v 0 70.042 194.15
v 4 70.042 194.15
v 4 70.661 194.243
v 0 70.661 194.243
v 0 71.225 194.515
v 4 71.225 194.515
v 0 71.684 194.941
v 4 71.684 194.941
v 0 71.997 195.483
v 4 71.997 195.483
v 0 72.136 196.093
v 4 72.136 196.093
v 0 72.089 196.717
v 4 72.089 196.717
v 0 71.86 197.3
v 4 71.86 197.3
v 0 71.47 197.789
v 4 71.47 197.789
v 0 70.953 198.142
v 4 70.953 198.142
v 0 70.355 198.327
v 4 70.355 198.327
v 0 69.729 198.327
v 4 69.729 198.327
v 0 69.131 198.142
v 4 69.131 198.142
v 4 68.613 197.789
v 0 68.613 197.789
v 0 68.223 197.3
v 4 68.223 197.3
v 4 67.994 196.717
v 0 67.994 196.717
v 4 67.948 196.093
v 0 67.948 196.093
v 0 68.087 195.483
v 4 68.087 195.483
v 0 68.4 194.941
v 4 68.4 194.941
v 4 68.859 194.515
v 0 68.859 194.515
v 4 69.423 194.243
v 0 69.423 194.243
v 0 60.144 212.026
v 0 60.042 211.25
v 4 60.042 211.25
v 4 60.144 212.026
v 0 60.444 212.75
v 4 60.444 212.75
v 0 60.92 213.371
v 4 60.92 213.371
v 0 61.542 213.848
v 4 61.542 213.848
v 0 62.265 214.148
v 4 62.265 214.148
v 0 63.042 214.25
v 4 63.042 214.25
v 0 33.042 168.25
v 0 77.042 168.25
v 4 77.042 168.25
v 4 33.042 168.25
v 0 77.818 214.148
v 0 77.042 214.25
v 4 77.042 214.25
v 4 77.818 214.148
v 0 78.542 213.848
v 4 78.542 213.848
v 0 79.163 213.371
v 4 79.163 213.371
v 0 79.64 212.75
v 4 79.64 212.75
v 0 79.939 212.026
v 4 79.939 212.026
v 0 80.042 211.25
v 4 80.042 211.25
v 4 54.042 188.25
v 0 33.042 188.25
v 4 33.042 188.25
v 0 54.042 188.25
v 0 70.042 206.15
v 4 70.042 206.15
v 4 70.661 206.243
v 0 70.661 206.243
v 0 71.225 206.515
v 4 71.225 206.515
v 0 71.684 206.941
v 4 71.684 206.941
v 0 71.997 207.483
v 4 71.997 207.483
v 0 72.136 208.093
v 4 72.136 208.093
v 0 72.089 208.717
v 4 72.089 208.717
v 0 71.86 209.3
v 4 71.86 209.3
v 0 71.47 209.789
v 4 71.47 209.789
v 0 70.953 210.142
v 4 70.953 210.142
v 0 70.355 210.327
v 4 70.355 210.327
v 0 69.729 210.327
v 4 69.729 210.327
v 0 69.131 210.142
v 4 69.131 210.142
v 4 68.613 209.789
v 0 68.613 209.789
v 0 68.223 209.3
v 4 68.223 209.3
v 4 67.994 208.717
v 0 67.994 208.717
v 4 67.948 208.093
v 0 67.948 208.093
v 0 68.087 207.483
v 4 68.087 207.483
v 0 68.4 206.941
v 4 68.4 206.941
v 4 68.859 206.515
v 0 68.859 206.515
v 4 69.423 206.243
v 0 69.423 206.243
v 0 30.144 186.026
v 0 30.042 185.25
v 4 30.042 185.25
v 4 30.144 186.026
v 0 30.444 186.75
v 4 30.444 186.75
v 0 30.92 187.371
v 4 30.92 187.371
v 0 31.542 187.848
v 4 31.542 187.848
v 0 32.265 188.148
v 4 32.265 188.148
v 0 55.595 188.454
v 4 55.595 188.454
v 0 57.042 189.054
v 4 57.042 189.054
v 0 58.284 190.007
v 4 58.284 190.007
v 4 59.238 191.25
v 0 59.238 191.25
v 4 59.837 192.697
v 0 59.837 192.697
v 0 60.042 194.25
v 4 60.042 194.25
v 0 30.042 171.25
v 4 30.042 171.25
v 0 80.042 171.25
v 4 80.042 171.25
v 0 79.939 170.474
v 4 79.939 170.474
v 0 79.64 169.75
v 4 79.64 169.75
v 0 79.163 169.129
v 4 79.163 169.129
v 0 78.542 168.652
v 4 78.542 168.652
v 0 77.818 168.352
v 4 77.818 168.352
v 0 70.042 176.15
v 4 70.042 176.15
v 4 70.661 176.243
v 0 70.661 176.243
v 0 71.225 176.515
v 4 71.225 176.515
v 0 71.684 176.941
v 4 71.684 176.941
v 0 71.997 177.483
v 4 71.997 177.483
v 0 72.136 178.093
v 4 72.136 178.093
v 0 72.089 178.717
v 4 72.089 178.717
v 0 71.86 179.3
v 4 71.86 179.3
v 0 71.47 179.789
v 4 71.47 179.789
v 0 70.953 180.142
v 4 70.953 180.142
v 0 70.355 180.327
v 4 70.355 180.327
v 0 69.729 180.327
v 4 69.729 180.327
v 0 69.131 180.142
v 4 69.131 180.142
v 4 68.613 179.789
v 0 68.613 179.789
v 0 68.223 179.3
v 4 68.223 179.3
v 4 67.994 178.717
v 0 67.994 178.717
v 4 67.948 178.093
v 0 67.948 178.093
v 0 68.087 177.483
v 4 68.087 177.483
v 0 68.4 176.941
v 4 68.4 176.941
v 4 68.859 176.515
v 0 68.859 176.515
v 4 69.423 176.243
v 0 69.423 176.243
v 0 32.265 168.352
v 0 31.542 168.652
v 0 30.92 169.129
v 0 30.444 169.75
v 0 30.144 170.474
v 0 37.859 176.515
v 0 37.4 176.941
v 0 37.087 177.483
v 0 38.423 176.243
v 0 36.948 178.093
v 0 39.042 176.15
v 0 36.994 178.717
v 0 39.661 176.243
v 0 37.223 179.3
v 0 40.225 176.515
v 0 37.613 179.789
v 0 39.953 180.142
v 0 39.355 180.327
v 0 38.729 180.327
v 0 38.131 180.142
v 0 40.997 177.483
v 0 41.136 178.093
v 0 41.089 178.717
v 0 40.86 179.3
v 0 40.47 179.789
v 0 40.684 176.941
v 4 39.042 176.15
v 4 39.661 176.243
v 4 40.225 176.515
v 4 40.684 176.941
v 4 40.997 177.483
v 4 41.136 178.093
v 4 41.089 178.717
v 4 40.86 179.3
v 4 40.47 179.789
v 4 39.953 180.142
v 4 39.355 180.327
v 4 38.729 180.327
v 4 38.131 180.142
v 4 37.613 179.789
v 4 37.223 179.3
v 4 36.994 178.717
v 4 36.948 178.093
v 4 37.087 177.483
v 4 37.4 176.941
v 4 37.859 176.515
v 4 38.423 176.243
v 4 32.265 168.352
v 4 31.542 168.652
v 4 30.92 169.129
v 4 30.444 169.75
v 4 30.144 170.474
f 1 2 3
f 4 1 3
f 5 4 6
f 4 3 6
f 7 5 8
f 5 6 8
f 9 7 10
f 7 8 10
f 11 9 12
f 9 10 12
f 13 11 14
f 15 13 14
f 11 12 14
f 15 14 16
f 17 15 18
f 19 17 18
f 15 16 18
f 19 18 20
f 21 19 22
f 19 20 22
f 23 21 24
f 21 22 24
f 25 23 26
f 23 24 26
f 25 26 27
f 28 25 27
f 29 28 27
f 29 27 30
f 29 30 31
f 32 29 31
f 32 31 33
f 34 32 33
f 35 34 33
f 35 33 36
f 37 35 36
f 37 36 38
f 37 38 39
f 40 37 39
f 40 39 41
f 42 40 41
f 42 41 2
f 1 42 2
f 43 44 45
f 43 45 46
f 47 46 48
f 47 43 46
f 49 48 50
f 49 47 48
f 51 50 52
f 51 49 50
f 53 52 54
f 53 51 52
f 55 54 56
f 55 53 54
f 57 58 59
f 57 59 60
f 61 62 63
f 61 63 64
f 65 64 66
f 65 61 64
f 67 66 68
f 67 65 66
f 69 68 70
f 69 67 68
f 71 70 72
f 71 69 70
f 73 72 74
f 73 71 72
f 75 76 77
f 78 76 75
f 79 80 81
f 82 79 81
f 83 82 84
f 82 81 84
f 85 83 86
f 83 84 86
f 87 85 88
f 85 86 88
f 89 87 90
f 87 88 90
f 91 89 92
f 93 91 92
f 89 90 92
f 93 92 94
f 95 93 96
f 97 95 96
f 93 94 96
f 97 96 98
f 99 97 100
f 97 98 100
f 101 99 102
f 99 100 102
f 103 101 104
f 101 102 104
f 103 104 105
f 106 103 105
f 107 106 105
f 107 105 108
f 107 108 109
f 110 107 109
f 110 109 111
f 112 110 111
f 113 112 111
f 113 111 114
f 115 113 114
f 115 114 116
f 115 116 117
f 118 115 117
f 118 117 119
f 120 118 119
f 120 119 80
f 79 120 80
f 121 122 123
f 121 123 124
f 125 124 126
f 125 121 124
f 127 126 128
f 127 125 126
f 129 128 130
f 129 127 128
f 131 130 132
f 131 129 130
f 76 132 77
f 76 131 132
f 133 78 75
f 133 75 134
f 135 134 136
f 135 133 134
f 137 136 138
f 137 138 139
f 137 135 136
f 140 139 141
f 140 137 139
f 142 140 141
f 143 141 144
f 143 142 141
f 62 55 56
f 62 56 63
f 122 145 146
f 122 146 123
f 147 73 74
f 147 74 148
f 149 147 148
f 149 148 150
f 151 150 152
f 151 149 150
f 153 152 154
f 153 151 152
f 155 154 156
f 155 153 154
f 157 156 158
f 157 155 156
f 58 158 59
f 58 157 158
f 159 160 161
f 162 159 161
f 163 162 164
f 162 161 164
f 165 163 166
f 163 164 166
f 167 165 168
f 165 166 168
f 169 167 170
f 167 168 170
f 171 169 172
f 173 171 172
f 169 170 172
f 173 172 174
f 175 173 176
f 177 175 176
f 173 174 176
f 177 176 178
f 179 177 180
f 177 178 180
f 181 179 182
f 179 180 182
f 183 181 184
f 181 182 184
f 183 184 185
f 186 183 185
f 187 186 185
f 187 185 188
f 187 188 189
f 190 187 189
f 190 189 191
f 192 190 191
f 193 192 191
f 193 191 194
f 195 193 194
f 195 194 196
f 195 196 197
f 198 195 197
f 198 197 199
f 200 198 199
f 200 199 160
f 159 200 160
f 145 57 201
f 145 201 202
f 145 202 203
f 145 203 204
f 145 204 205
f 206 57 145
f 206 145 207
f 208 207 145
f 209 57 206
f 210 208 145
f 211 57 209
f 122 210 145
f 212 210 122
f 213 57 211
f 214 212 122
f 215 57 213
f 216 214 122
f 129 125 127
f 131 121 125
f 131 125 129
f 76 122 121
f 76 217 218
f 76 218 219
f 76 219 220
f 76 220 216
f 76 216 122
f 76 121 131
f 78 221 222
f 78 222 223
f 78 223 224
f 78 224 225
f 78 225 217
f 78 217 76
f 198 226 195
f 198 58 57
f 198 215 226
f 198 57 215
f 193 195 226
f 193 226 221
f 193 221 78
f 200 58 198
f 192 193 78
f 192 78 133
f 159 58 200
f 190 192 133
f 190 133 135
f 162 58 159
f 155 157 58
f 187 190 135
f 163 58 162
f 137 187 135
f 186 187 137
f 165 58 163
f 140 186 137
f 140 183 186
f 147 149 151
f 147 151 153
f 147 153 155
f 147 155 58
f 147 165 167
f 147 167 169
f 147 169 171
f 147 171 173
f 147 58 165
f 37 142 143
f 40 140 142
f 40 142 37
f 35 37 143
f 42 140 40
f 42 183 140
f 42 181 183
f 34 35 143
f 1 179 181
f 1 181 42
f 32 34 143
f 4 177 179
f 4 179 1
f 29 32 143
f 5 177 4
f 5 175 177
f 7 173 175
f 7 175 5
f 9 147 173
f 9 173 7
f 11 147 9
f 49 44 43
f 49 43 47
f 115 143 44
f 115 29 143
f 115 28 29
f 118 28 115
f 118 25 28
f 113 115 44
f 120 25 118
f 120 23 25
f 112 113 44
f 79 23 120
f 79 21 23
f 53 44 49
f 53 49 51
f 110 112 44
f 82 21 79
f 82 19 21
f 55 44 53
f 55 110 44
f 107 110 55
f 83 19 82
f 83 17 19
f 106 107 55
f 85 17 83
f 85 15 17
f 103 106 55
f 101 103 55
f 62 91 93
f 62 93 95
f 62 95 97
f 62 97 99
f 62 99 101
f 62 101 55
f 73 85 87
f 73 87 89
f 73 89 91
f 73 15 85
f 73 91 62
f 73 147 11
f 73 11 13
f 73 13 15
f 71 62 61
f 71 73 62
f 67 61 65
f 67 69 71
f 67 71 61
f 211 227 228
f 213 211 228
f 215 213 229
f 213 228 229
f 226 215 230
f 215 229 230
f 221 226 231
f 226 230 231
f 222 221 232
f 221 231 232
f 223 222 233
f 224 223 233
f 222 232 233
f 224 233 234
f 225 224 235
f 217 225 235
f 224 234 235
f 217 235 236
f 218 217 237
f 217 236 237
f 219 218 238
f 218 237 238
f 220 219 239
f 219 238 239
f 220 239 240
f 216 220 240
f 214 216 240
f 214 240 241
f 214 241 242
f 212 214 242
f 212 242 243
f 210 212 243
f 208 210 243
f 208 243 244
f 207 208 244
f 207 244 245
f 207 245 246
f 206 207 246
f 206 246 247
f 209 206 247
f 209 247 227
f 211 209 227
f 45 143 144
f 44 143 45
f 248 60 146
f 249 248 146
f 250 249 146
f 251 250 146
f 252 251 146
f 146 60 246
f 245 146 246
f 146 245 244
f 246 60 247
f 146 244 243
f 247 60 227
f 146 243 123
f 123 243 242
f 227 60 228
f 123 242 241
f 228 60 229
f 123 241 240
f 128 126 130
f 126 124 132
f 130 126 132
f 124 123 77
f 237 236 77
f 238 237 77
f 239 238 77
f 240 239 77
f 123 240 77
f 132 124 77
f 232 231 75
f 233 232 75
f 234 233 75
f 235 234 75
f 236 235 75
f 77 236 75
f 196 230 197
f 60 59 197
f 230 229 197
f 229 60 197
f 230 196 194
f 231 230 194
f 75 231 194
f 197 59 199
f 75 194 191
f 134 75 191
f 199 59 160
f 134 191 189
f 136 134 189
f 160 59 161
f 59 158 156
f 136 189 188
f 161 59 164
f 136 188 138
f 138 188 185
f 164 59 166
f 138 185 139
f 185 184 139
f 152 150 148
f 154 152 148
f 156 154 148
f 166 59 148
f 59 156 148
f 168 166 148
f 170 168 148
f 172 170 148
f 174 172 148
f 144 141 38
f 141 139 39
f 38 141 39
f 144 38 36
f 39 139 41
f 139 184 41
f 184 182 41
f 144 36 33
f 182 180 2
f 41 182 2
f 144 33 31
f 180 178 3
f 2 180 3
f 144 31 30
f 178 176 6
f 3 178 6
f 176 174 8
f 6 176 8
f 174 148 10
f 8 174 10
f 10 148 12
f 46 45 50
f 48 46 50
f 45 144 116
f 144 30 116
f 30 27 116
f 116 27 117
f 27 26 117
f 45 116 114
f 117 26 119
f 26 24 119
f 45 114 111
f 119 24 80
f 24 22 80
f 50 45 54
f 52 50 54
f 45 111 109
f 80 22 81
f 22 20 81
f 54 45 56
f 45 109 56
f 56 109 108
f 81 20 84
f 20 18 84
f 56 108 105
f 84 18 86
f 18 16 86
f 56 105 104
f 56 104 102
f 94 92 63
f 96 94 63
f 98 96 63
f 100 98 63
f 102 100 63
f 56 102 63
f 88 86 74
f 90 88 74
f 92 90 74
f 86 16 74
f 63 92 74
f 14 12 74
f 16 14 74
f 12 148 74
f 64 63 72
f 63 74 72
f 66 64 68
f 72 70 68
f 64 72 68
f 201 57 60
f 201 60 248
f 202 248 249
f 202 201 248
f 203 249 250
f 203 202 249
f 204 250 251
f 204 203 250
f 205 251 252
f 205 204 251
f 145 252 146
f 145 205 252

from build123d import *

# Parameters (mm, degrees)
EXTRUDE_1_DEPTH     = 4
SKETCH_3_R          = 2.1
CUT_EXTRUDE_1_DEPTH = 10


with BuildPart() as part:
    # 草图2 → 凸台-拉伸1 (new body)
    with BuildSketch(Plane(origin=(0, 0, 0), x_dir=(0, 0, -1), z_dir=(1, 0, 0))):
        with BuildLine():
            Line((-211.25, 80.041666667), (-171.25, 80.041666667))
            ThreePointArc((-171.25, 80.041666667), (-169.128679656, 79.16298701), (-168.25, 77.041666667))
            Line((-168.25, 77.041666667), (-168.25, 33.041666667))
            ThreePointArc((-168.25, 33.041666667), (-169.128679656, 30.920346323), (-171.25, 30.041666667))
            Line((-171.25, 30.041666667), (-185.25, 30.041666667))
            ThreePointArc((-185.25, 30.041666667), (-187.371320344, 30.920346323), (-188.25, 33.041666667))
            Line((-188.25, 33.041666667), (-188.25, 54.041666667))
            ThreePointArc((-188.25, 54.041666667), (-190.007359313, 58.284307354), (-194.25, 60.041666667))
            Line((-194.25, 60.041666667), (-211.25, 60.041666667))
            ThreePointArc((-211.25, 60.041666667), (-213.371320344, 60.920346323), (-214.25, 63.041666667))
            Line((-214.25, 63.041666667), (-214.25, 77.041666667))
            ThreePointArc((-214.25, 77.041666667), (-213.371320344, 79.16298701), (-211.25, 80.041666667))
        make_face()
    extrude(amount=EXTRUDE_1_DEPTH)

    # 草图3 → 切除-拉伸1 (cut)
    with BuildSketch(Plane(origin=(4, 0, 0), x_dir=(0, 0, -1), z_dir=(1, 0, 0))):
        with Locations((-208.25, 70.041666667)):
            Circle(SKETCH_3_R)
        with Locations((-178.25, 70.041666667)):
            Circle(SKETCH_3_R)
        with Locations((-178.25, 39.041666667)):
            Circle(SKETCH_3_R)
        with Locations((-196.25, 70.041666667)):
            Circle(SKETCH_3_R)
    extrude(amount=-CUT_EXTRUDE_1_DEPTH, mode=Mode.SUBTRACT)


solid = part.part
